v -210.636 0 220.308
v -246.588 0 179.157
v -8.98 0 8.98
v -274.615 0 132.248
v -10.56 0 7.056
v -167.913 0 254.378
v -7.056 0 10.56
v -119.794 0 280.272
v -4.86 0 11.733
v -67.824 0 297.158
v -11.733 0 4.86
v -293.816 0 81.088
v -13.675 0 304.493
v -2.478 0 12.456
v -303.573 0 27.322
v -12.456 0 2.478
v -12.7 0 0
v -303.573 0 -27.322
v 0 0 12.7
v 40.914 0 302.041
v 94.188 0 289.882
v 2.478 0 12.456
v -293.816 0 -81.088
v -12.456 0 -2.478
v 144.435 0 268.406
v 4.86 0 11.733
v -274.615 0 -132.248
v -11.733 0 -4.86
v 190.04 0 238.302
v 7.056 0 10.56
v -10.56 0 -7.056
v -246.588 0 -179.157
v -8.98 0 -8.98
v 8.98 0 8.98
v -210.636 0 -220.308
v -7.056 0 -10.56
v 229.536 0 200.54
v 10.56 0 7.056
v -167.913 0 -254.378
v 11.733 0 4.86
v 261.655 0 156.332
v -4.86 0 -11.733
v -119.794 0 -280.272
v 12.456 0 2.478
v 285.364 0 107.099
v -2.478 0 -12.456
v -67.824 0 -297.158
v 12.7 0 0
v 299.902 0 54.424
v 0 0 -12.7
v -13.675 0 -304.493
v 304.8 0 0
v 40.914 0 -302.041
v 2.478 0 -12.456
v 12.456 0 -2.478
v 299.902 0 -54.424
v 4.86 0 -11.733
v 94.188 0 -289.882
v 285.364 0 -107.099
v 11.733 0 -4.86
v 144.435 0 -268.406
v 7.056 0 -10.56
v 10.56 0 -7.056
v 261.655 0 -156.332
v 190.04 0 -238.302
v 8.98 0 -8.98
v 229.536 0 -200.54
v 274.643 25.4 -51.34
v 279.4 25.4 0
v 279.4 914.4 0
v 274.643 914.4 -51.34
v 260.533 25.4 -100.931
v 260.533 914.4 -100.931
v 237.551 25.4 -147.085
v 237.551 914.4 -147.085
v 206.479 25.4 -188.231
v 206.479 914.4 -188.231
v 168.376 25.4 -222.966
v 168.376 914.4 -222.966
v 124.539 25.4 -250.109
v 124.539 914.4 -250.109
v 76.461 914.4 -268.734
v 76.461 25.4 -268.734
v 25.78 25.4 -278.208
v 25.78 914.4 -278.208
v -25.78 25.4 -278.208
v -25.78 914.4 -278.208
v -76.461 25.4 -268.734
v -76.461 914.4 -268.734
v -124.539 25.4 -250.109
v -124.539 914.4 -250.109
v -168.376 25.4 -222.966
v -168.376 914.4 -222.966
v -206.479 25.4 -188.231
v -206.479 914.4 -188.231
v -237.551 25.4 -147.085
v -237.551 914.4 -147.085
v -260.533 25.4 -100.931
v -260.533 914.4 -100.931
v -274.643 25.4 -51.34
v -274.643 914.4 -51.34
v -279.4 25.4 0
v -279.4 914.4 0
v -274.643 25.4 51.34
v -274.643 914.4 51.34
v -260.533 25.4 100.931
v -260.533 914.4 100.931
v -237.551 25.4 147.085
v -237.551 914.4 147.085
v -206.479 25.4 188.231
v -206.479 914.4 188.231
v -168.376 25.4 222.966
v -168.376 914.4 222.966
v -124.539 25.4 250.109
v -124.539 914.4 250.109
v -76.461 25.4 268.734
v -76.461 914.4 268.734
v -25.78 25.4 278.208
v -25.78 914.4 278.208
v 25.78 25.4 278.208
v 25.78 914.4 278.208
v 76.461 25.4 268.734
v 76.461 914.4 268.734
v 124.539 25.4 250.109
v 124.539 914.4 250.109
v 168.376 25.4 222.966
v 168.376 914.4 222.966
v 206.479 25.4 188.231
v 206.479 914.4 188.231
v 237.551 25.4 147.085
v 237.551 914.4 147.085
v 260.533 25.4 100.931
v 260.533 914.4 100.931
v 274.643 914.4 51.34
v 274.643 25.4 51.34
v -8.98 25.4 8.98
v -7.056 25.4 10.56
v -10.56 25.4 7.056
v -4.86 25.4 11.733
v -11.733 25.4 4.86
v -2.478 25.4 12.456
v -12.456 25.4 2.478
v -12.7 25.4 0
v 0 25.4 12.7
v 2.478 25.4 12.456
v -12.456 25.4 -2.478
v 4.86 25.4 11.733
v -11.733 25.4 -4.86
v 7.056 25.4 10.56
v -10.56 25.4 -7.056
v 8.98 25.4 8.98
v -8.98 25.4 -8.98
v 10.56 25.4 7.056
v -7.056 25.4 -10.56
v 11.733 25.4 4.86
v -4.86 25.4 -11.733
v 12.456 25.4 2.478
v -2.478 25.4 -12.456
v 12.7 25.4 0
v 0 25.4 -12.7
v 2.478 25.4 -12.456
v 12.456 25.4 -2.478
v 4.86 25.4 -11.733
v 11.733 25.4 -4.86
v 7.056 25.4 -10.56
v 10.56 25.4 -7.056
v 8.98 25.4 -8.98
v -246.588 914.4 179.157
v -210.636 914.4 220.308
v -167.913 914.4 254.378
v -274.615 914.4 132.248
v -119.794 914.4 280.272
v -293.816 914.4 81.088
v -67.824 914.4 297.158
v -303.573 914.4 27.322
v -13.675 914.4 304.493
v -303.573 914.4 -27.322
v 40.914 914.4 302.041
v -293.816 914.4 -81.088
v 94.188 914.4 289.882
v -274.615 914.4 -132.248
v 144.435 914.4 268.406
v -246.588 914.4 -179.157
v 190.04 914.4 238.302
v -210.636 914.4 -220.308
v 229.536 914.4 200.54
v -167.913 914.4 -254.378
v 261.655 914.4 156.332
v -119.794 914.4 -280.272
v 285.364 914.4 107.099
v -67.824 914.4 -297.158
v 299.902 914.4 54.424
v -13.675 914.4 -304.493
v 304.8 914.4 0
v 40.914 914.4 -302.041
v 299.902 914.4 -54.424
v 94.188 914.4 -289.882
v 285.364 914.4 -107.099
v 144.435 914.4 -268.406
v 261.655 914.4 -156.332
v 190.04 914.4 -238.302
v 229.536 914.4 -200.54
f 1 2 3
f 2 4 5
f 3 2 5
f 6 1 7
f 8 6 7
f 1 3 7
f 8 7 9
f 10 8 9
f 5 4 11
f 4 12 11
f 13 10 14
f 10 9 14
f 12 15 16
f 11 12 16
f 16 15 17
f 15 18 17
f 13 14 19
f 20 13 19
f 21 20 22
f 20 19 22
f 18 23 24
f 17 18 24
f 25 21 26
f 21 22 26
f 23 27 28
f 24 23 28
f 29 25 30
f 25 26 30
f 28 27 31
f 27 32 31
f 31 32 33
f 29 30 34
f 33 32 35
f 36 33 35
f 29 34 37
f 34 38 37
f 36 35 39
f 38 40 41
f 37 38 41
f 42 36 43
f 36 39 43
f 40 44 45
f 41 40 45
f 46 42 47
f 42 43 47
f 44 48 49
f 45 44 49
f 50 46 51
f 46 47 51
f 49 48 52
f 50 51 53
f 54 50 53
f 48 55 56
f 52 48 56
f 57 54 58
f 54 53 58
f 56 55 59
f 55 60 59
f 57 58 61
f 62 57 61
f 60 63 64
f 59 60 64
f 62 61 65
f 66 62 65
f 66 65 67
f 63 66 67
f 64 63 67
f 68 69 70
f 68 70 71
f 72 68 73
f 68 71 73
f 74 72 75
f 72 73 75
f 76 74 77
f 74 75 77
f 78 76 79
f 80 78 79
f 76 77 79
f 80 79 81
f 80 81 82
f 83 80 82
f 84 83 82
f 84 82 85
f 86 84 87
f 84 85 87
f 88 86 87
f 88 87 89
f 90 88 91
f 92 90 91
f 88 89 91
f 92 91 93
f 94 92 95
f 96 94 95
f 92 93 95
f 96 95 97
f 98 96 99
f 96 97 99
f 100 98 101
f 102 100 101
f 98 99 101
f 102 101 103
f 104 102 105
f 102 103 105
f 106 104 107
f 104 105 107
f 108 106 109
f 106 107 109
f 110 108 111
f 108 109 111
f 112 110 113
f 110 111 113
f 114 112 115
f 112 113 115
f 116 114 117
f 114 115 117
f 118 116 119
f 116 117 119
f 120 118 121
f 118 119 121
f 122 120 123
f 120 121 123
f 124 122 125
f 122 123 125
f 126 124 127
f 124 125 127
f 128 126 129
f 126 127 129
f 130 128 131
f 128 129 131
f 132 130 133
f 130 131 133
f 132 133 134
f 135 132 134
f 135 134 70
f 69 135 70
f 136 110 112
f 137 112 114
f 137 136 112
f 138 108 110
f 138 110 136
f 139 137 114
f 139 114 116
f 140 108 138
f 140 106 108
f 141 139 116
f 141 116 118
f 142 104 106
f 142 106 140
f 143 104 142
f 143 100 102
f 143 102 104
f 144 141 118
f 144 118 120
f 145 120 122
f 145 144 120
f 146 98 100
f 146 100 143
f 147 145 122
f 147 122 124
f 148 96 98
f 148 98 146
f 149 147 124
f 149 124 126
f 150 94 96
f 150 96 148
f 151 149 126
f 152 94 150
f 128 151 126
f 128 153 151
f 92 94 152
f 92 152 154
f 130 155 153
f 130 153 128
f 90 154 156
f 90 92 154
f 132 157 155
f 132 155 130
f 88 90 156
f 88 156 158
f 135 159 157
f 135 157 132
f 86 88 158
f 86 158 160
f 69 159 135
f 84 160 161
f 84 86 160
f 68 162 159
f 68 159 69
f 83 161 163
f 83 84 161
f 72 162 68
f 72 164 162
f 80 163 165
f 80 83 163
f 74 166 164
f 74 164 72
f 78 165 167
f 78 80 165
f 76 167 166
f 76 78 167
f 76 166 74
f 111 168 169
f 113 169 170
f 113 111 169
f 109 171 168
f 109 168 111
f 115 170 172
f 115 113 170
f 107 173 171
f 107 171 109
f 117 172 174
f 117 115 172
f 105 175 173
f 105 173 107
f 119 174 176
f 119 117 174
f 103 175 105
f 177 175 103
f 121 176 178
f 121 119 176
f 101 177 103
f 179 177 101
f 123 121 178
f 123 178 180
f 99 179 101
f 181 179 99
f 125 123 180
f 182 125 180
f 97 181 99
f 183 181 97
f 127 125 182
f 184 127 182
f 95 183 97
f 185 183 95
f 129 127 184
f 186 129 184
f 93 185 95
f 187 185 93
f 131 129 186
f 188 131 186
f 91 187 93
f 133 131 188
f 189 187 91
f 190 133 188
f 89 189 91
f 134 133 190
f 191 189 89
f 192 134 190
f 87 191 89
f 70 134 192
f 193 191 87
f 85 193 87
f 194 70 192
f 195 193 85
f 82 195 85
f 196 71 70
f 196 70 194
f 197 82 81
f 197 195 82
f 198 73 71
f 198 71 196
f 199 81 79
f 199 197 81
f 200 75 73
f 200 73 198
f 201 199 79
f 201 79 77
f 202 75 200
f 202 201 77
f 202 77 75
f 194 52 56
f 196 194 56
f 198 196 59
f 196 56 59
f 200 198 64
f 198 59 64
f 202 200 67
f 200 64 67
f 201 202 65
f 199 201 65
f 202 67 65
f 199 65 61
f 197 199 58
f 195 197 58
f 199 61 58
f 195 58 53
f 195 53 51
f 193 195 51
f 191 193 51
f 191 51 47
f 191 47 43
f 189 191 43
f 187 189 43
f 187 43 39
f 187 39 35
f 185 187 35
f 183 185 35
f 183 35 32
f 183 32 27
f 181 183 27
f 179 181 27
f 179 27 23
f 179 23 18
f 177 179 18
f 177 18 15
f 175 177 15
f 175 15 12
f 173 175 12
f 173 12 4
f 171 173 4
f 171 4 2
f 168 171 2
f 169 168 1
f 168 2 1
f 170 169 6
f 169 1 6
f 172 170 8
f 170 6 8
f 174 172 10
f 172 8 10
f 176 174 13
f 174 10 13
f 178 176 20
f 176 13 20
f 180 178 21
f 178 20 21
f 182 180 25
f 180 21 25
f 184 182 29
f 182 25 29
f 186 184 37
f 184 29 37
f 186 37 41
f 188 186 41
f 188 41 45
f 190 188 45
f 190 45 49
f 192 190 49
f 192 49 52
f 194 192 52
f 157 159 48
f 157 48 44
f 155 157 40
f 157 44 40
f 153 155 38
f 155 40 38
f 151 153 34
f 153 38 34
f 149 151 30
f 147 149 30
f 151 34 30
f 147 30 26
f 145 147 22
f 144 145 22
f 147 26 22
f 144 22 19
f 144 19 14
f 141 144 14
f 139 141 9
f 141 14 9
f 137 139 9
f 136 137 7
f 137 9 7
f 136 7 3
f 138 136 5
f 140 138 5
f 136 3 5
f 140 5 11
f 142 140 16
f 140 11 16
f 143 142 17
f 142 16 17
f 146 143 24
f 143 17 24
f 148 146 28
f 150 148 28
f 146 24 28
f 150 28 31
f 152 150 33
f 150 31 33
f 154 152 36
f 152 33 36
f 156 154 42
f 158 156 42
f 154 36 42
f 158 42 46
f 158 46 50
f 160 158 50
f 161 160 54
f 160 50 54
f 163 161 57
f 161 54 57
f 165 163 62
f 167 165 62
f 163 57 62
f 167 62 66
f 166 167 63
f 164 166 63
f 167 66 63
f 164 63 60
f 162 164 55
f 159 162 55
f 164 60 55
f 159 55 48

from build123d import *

# Parameters (mm, degrees)
SKETCH1_R           = 304.8
BOSS_EXTRUDE1_DEPTH = 914.4
SKETCH2_OUTSIDE_W   = 862.944
SKETCH2_OUTSIDE_H   = 862.944
SKETCH2_OUTSIDE_R   = 304.8
SKETCH2_OUTSIDE_R_2 = 279.4
CUT_EXTRUDE2_DEPTH  = 889
SKETCH3_R           = 12.7
CUT_EXTRUDE3_DEPTH  = 25.4


with BuildPart() as part:
    # Sketch1 → Boss-Extrude1 (new body)
    with BuildSketch(Plane(origin=(0, 0, 0), x_dir=(1, 0, 0), z_dir=(0, 1, 0))):
        Circle(SKETCH1_R)
    extrude(amount=BOSS_EXTRUDE1_DEPTH)

    # Sketch2 outside → Cut-Extrude2 (cut)
    with BuildSketch(Plane(origin=(0, 914.4, 0), x_dir=(1, 0, 0), z_dir=(0, 1, 0))):
        Rectangle(SKETCH2_OUTSIDE_W, SKETCH2_OUTSIDE_H)
        Circle(SKETCH2_OUTSIDE_R, mode=Mode.SUBTRACT)
        Circle(SKETCH2_OUTSIDE_R_2)
    extrude(amount=-CUT_EXTRUDE2_DEPTH, mode=Mode.SUBTRACT)

    # Sketch3 → Cut-Extrude3 (cut)
    with BuildSketch(Plane.XZ):
        Circle(SKETCH3_R)
    extrude(amount=-CUT_EXTRUDE3_DEPTH, mode=Mode.SUBTRACT)


solid = part.part
